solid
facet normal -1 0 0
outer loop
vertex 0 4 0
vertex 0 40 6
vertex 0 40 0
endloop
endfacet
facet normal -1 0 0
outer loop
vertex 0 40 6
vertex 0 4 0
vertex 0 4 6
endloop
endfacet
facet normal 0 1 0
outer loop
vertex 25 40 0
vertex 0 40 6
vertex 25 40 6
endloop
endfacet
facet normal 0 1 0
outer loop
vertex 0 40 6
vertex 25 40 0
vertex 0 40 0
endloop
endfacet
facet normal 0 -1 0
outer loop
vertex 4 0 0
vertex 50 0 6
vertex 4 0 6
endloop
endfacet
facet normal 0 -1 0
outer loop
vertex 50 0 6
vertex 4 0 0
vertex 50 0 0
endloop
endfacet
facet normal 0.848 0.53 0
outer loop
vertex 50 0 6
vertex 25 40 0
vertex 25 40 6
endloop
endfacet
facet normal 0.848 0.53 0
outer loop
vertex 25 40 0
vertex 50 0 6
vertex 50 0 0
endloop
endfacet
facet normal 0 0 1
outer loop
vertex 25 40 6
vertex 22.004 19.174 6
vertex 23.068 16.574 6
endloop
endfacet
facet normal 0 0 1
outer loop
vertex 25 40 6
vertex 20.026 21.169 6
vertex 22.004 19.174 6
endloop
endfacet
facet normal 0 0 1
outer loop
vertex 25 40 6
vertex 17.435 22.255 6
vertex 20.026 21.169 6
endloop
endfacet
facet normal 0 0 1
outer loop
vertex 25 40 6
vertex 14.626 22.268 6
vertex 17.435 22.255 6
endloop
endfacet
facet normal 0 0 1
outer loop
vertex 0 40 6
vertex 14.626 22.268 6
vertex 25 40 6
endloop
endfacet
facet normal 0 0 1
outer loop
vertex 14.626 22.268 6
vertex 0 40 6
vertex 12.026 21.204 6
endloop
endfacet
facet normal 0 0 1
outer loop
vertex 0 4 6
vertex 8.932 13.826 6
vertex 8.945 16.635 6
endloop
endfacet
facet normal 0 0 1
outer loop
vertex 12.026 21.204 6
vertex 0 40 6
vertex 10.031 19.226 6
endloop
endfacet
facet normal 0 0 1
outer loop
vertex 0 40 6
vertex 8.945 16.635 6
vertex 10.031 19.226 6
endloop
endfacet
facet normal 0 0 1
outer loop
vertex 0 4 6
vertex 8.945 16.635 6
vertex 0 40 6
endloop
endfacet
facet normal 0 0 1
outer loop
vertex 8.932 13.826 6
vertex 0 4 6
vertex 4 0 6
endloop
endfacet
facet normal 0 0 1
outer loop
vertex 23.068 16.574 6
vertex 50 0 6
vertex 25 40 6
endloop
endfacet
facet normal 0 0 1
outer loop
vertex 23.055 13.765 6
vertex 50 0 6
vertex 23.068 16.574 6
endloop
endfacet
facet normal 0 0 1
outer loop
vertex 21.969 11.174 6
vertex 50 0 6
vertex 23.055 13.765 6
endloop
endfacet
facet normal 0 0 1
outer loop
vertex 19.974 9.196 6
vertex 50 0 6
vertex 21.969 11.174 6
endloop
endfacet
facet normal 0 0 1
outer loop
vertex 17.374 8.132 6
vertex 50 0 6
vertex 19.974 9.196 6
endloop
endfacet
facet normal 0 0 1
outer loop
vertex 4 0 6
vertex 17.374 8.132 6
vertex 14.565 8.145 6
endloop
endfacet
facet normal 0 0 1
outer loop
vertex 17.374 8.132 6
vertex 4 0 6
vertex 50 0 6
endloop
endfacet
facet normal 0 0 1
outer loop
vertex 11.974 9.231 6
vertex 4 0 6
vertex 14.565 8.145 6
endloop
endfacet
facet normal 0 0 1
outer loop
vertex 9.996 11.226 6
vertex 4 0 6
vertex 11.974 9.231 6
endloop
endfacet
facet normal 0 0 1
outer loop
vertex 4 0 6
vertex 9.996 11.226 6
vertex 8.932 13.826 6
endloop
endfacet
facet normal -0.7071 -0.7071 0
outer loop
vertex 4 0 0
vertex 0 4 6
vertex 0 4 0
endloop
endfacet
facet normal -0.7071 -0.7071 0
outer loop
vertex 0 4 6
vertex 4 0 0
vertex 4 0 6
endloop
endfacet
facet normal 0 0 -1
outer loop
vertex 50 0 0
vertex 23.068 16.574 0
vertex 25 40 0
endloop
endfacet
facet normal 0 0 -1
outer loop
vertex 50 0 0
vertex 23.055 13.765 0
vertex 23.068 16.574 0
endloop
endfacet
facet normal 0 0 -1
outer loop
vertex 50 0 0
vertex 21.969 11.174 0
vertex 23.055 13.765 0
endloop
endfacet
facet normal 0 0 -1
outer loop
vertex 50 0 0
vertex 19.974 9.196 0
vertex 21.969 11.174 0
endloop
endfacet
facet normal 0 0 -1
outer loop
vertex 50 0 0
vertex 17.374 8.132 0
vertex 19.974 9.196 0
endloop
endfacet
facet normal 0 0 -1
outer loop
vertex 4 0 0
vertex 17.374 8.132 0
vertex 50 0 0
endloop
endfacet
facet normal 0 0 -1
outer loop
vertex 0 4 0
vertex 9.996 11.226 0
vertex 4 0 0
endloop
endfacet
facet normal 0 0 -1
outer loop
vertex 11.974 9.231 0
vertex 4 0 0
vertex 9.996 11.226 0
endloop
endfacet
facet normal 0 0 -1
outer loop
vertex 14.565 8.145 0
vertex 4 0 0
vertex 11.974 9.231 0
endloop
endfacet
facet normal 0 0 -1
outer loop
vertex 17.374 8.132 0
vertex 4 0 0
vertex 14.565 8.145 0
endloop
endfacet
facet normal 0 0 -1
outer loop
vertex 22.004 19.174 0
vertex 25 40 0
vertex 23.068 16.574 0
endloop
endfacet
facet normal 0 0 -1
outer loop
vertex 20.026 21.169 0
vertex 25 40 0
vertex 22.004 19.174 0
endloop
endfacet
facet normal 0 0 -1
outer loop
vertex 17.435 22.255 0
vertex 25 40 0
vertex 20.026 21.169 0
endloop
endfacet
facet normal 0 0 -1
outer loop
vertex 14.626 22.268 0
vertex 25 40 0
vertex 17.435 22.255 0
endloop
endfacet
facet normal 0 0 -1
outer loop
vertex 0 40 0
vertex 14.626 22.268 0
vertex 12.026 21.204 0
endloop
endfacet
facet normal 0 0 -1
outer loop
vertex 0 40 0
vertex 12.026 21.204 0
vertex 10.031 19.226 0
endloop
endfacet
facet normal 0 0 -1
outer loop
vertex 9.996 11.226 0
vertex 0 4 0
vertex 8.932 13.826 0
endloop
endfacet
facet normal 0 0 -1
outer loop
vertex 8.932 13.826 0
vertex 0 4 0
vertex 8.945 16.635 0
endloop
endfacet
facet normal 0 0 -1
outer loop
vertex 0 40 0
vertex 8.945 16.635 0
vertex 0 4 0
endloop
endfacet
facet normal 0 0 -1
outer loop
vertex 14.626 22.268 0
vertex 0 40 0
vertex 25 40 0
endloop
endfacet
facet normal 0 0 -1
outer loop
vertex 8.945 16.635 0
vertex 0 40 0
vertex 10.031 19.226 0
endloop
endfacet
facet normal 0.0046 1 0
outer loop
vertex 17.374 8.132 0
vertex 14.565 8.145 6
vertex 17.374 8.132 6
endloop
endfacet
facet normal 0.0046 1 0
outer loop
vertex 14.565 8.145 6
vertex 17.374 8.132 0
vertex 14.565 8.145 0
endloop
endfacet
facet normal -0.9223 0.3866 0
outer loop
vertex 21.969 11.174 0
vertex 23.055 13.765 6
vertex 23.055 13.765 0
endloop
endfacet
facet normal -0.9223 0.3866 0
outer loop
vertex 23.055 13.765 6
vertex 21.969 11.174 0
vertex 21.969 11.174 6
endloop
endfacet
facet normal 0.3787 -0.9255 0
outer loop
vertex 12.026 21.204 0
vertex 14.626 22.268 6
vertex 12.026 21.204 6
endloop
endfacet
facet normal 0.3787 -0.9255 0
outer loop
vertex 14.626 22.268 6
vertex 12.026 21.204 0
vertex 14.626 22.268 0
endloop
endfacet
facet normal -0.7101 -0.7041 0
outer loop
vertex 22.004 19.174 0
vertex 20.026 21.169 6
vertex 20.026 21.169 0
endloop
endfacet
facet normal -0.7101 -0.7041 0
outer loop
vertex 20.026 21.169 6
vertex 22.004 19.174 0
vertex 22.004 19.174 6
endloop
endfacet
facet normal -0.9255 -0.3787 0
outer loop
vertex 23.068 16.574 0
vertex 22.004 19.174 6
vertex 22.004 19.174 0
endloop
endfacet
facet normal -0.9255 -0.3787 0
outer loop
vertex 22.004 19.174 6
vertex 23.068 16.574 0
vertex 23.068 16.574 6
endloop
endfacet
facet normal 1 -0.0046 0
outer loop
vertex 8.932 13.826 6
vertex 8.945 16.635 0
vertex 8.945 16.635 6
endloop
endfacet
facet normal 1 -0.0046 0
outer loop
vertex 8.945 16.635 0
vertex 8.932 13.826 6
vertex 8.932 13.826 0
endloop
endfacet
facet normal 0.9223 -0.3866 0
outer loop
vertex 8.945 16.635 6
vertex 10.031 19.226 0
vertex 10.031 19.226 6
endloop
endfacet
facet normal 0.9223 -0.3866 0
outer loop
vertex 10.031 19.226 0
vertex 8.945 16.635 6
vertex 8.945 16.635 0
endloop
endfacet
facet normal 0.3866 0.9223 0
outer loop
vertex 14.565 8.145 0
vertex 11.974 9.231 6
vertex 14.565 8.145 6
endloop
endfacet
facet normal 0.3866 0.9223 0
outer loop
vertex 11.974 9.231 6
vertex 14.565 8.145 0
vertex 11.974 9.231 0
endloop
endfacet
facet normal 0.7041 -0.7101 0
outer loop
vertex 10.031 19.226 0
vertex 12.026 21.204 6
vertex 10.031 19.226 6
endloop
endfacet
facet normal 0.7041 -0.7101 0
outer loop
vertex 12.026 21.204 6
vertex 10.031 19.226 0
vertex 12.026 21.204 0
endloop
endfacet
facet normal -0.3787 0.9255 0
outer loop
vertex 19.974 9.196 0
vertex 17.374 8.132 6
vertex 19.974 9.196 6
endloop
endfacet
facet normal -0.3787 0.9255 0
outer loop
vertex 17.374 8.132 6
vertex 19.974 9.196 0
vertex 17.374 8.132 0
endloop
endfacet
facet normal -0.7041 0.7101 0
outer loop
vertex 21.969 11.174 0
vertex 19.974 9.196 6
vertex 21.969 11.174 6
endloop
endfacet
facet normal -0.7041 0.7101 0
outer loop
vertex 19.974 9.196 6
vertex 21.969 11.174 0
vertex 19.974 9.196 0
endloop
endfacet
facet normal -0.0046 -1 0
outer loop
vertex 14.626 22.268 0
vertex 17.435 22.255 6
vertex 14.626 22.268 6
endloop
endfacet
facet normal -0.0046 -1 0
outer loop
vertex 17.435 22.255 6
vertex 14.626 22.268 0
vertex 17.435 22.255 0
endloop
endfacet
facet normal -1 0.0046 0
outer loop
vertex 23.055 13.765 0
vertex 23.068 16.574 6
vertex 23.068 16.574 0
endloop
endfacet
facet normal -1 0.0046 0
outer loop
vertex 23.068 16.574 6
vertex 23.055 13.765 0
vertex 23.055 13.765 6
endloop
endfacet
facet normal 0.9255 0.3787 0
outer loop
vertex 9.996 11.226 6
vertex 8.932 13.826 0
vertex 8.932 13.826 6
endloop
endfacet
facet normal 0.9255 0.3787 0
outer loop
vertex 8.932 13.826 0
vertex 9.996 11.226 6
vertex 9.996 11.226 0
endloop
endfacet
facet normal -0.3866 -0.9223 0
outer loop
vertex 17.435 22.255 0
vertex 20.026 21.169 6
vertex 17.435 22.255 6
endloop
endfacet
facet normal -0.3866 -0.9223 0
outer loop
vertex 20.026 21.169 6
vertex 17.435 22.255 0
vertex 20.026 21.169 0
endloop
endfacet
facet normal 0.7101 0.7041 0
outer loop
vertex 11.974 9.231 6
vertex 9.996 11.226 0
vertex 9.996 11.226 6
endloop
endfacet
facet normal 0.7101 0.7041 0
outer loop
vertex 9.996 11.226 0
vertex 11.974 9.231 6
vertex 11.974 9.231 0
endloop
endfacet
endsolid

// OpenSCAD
$fn = 32;

// ----------------------------------------------------------------------
// Bracket plate: gusset 50 x 40
// ----------------------------------------------------------------------

// --- parameters (mm) ---
hole_r = 3.5;             // bolt hole radius
plate_t = 6;              // plate thickness, Z (extrusion height)
gus_a = 50;               // base length
gus_b = 40;               // height
top_x = 25;               // top edge X of the angled cut
light_r = 7.2;            // lightening hole radius

light_d = 2 * light_r;

profile = [[4, 0], [25, 0], [50, 0], [25, 40], [0, 40], [0, 4]];  // primary outline, 6 points, counter clockwise
void_1 = [[23.068, 16.574], [22.004, 19.174], [20.026, 21.169], [17.435, 22.255], [14.626, 22.268], [12.026, 21.204], [10.031, 19.226], [8.945, 16.635], [8.932, 13.826], [9.996, 11.226], [11.974, 9.231], [14.565, 8.145], [17.374, 8.132], [19.974, 9.196], [21.969, 11.174], [23.055, 13.765]];  // lightening hole, 16 points

// --- the one profile operation ---
difference() {
  linear_extrude(height = plate_t) polygon(points = profile);
  translate([0, 0, -1])
    linear_extrude(height = plate_t + 2) polygon(points = void_1);
}
